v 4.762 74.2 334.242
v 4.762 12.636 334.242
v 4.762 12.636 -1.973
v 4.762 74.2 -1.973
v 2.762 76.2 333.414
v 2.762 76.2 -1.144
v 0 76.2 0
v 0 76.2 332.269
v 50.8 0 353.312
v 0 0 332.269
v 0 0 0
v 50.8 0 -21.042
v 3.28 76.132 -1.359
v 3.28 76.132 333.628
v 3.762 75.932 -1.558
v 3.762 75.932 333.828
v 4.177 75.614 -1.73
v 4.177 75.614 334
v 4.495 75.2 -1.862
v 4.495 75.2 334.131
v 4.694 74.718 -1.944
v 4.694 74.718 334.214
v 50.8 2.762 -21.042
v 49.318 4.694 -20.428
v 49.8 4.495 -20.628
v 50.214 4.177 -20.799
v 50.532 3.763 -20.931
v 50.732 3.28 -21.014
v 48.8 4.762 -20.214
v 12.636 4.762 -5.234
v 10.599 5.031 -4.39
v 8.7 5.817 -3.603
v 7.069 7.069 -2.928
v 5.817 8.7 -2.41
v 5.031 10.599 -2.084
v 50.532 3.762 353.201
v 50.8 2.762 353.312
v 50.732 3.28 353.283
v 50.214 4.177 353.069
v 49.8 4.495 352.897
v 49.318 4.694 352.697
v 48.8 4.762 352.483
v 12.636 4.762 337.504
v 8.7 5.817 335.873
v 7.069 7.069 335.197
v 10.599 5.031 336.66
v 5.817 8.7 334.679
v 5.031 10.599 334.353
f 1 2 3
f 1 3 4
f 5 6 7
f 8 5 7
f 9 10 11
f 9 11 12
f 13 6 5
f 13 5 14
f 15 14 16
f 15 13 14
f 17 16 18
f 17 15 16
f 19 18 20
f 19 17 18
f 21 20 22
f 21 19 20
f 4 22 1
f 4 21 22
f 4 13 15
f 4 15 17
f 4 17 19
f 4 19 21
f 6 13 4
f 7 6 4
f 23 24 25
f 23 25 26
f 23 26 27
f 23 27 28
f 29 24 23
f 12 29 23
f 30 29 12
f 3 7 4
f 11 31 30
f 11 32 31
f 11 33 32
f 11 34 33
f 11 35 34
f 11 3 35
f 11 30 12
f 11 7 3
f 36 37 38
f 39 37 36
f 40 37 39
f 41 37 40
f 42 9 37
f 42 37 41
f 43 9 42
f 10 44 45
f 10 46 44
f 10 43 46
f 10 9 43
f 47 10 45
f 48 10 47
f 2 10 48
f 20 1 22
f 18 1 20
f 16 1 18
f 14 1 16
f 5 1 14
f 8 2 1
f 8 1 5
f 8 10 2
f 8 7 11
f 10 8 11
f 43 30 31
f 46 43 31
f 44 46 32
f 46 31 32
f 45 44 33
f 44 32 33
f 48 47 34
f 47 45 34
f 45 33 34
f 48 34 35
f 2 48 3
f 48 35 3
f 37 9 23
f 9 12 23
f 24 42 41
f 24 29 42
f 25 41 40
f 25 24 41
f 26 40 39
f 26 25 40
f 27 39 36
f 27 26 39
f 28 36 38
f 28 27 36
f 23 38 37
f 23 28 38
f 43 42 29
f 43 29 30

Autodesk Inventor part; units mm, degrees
ref_plane "Start plane" through (0, 0, -21.042) normal (0, 0, 1) x (1, 0, 0)
ref_plane "End plane" through (0, 0, 353.3115) normal (0, 0, 1) x (1, 0, 0)
sketch "Sketch" plane through (0, 0, 0) normal (0, 0, 1) x (1, 0, 0)
  line L0 (0, 76.2) -> (0, 0)
  line L1 (0, 0) -> (50.8, 0)
  line L2 (50.8, 0) -> (50.8, 2.7625)
  line L3 (48.8, 4.7625) -> (12.6365, 4.7625)
  line L4 (4.7625, 12.6365) -> (4.7625, 74.2)
  line L5 (2.7625, 76.2) -> (0, 76.2)
  line L6 (-7.0414, 0) -> (21.5385, 0) construction
  line L7 (0, -8.0414) -> (0, 34.5385) construction
  arc A0 (4.7625, 12.6365) -> (12.6365, 4.7625) centre (12.6365, 12.6365) ccw
  arc A1 (50.8, 2.7625) -> (48.8, 4.7625) centre (48.8, 2.7625) ccw
  arc A2 (4.7625, 74.2) -> (2.7625, 76.2) centre (2.7625, 74.2) ccw
  line L8 (0, 93.5453) -> (0, -24.9725) construction
  line L9 (-18.6925, 0) -> (62.8653, 0) construction
  point P0 (50.8, 4.7625)
  point P1 (4.7625, 4.7625)
  point P2 (4.7625, 76.2)
  dimension "d12" = 4.7625
  dimension "d13" = 76.2
  dimension "d14" = 50.8
  dimension "d15" = 0
  dimension "d16" = 4.7625
  dimension "d17" = 0
  dimension "d18" = 7.874
  dimension "d19" = 2
extrude "Body" add sketch "Sketch" along normal up to surface (374.3536 mm away) from surface at -21.042
ref_plane "Work Plane3" through (50.8, 38.1, -21.042) normal (-0.3827, 0, -0.9239) x (-0.9239, 0, 0.3827)
split "Split1" plane through (50.8, 38.1, -21.042) removes the side toward (-0.3827, 0, -0.9239)
ref_plane "Work Plane4" through (50.8, 38.1, 353.3115) normal (-0.3827, 0, 0.9239) x (0.9239, 0, 0.3827)
split "Split2" plane through (50.8, 38.1, 353.3115) removes the side toward (-0.3827, 0, 0.9239)
equation "\"d12\" = G_T"
equation "\"d13\" = G_H"
equation "\"d14\" = G_W"
equation "\"d16\" = G_T"
equation "\"d18\" = G_IR"
equation "\"d4\" = G_L"
equation "\"G_W\" = 50.8"
equation "\"G_H\" = 76.2"
equation "\"G_T\" = 4.7625"
equation "\"G_ER\" = 4.064"
equation "\"G_IR\" = 7.874"
equation "\"G_L\" = B_L + G_OFFSET_START + G_OFFSET_END"
equation "\"ex\" = 0"
equation "\"ey\" = 0"
equation "\"G_OFFSET_START\" = 21.04205"
equation "\"G_OFFSET_END\" = 21.04205"
equation "\"d20\" = -G_OFFSET_START"
equation "\"d21\" = G_OFFSET_END + B_L"
equation "\"B_L\" = 332.26948"
properties part number "ANSI L 3 x 2 x 3_16 00000012"
